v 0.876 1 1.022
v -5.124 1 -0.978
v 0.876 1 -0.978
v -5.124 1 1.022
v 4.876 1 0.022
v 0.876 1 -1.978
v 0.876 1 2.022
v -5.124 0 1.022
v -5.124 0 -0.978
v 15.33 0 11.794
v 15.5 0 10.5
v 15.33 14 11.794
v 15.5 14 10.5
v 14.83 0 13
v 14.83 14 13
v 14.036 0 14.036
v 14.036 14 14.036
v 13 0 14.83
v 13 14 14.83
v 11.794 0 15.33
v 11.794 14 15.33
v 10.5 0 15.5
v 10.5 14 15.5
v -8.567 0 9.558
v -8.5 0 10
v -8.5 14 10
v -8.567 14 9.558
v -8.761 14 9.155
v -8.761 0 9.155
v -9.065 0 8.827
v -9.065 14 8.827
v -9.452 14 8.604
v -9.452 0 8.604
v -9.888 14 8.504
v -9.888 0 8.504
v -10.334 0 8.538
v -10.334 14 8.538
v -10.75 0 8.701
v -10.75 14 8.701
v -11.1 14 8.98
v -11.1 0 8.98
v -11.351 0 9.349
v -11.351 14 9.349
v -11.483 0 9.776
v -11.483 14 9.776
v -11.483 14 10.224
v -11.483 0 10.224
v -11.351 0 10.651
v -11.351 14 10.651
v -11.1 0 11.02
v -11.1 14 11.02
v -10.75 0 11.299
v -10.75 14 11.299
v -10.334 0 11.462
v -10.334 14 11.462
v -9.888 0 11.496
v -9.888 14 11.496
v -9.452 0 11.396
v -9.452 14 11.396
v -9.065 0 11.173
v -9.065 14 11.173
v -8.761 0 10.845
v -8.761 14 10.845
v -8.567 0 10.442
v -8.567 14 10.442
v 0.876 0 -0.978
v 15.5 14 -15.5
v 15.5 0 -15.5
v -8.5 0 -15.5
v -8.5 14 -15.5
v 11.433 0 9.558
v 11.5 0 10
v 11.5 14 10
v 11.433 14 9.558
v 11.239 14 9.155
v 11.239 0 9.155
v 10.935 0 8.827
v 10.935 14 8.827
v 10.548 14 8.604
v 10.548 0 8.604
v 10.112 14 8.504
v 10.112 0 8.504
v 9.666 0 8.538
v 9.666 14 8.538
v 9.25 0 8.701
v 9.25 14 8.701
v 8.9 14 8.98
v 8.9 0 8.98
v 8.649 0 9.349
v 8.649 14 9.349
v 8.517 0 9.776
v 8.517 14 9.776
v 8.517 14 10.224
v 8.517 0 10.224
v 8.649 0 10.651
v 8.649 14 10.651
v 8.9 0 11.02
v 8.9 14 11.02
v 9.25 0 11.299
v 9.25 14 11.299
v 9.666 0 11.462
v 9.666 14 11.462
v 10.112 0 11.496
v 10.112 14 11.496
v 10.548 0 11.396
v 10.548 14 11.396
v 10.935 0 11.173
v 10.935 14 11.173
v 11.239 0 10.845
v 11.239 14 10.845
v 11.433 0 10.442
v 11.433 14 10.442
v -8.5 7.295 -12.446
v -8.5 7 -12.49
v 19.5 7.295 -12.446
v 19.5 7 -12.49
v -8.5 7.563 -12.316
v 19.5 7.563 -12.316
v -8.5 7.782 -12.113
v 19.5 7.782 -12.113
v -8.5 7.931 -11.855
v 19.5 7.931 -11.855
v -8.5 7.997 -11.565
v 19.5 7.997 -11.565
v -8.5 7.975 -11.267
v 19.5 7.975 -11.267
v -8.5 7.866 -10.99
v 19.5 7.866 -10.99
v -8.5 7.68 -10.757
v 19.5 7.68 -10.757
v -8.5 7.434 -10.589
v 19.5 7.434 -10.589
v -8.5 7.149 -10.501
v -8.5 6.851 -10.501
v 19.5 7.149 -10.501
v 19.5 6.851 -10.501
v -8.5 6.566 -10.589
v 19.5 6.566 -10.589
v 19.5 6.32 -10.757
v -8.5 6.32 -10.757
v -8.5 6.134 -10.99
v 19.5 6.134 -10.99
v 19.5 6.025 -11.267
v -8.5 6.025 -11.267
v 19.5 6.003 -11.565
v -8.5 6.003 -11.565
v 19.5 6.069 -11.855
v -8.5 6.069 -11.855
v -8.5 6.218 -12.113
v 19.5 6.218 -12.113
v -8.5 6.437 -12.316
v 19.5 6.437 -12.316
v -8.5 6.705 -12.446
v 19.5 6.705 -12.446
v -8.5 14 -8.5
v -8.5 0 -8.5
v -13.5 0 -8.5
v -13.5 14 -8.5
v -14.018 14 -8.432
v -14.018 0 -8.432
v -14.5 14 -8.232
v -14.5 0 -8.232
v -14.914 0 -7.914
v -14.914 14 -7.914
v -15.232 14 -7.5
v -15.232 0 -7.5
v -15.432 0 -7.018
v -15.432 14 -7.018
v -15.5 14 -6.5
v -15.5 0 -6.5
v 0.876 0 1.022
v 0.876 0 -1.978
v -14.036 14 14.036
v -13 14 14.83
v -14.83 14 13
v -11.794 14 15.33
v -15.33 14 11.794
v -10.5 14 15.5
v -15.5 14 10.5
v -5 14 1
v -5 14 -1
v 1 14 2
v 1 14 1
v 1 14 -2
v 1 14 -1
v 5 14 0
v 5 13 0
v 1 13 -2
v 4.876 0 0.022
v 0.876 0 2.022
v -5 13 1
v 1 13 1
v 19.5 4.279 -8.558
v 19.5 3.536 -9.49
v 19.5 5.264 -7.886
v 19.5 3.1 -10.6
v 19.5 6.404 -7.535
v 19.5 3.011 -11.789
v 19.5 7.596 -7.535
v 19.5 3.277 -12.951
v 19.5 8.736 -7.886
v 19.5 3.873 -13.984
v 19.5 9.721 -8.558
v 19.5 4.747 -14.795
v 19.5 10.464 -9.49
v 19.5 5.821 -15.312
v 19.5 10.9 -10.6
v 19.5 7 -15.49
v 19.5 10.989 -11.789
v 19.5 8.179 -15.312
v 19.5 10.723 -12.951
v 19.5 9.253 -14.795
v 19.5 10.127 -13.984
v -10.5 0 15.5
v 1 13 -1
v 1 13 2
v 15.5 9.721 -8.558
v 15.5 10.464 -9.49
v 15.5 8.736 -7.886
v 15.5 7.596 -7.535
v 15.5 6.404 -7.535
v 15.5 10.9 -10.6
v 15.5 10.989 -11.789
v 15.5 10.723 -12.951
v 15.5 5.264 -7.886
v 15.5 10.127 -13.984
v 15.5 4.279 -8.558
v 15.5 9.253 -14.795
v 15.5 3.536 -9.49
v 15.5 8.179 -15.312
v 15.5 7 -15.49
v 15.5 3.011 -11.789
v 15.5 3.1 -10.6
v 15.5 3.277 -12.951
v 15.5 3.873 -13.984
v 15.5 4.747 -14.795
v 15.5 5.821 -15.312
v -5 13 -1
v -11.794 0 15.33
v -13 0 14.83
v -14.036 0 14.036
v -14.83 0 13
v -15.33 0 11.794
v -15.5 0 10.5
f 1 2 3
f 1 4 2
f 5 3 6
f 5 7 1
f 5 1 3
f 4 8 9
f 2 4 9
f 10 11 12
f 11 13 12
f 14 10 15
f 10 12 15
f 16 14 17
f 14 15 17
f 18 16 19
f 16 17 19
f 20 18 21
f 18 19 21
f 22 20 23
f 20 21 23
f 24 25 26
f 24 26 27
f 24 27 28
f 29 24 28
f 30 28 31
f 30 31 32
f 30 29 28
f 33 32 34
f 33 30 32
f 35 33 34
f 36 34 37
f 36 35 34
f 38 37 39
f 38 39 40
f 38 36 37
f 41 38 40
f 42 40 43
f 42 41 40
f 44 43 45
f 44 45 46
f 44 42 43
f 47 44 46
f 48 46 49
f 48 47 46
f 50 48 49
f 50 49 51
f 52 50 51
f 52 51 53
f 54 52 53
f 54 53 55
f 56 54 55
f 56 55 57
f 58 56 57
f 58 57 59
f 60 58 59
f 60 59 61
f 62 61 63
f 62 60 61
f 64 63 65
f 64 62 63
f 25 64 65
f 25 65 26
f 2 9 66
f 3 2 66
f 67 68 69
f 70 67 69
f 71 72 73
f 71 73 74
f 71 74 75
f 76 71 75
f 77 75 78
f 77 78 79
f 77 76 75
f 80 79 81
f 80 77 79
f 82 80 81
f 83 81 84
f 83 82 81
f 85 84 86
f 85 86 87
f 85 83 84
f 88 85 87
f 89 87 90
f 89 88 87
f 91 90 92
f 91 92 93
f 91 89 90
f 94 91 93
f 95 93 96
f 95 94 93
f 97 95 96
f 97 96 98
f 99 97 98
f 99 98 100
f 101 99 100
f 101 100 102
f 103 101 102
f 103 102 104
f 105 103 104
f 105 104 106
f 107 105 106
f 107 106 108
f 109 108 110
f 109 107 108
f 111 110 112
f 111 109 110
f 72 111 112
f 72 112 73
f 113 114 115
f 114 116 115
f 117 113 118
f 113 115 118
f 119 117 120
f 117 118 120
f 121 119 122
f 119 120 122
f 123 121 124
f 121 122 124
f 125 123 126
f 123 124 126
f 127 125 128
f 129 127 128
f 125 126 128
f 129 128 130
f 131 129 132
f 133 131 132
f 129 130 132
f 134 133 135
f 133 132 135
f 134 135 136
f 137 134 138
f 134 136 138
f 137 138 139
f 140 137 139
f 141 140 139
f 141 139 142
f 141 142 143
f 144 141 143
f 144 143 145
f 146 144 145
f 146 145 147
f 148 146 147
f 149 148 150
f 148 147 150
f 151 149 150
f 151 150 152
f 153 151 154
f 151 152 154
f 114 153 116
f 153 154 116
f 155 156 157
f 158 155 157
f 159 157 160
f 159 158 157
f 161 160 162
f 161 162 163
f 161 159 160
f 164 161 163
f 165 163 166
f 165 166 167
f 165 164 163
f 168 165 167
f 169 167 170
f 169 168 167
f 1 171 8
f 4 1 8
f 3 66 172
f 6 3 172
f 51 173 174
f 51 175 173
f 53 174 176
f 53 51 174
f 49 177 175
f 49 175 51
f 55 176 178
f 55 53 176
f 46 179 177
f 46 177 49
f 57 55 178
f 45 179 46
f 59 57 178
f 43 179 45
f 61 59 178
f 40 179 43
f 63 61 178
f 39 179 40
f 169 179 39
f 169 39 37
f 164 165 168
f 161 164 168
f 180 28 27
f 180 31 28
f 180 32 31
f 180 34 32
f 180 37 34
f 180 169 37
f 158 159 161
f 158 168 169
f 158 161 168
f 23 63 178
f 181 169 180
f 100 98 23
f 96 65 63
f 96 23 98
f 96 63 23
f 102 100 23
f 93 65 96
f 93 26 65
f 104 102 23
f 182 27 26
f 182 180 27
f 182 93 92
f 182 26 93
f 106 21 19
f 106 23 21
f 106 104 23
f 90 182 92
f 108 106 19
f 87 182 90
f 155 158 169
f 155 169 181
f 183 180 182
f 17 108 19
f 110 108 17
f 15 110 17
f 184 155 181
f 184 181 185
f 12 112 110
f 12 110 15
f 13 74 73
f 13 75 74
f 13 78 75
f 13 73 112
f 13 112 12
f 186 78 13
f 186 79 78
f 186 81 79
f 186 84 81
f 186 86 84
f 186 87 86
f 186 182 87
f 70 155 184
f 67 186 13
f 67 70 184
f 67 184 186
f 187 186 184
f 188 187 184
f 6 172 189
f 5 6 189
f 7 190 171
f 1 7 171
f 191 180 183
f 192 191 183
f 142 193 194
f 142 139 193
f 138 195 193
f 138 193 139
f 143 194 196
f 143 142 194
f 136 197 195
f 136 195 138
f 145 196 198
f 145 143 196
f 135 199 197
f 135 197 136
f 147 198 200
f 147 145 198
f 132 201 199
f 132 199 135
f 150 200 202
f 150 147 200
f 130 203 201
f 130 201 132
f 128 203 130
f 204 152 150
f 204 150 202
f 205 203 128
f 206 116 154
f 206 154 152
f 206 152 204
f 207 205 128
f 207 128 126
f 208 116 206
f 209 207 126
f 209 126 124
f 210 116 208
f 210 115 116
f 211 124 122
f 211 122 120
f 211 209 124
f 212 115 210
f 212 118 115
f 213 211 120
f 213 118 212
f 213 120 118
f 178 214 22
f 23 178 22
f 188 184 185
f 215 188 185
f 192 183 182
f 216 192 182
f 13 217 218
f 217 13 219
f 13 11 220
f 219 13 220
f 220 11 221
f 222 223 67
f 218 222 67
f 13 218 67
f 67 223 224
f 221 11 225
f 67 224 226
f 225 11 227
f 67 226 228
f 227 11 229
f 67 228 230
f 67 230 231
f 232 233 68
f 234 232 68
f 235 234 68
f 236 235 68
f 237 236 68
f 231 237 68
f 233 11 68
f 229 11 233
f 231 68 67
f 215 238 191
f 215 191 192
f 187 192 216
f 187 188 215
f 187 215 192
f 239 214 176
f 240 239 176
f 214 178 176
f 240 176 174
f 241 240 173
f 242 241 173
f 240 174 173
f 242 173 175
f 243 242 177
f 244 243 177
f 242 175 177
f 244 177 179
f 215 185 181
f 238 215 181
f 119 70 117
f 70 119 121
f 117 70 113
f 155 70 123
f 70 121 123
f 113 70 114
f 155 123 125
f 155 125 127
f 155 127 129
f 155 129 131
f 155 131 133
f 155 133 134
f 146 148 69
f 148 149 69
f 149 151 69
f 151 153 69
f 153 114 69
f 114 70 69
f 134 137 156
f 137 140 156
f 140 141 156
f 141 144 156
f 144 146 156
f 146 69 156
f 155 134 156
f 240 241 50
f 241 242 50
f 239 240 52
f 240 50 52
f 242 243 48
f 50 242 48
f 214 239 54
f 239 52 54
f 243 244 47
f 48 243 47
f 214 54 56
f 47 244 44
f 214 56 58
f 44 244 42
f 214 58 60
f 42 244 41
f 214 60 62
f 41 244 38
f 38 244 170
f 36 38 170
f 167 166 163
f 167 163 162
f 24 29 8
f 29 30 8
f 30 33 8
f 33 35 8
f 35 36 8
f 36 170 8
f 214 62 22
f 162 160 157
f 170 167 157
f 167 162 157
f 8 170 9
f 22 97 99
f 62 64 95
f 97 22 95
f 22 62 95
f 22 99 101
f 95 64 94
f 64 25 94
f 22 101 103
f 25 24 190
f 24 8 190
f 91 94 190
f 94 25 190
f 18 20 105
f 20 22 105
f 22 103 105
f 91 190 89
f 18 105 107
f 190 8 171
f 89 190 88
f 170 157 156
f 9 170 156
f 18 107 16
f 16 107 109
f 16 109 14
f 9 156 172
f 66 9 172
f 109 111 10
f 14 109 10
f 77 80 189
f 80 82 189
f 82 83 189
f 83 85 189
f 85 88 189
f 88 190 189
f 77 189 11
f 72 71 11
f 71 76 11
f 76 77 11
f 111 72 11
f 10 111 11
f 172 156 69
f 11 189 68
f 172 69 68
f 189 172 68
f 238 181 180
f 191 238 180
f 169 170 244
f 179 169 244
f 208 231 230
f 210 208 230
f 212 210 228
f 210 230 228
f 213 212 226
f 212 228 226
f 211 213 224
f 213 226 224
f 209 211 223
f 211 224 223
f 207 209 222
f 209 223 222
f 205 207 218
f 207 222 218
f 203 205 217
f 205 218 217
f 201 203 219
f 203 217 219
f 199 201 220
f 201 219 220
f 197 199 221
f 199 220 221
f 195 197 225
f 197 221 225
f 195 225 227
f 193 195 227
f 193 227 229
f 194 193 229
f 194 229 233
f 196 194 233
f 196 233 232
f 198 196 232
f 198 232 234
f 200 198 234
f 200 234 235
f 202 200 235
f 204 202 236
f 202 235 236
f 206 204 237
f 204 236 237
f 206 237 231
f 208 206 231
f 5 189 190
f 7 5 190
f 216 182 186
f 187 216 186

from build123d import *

# Parameters (mm, degrees)
ESBO_O1_R                  = 1.5
RESSALTO_EXTRUS_O1_DEPTH   = 14
FILETE4_R                  = 5
FILETE5_R                  = 2
ESBO_O5_R                  = 4
RESSALTO_EXTRUS_O4_DEPTH   = 4
ESBO_O6_R                  = 1
CORTE_EXTRUS_O3_DEPTH      = 5
CORTE_EXTRUS_O3_DEPTH_BACK = 32
CORTE_EXTRUS_O4_DEPTH      = 1
CORTE_EXTRUS_O5_DEPTH      = 1


with BuildPart() as part:
    # Esboço1 → Ressalto-extrusão1 (new body)
    with BuildSketch(Plane(origin=(0, 0, 0), x_dir=(1, 0, 0), z_dir=(0, 1, 0))):
        Polygon((15.5, 15.5), (-8.5, 15.5), (-8.5, 8.5), (-15.5, 8.5), (-15.5, -15.5), (15.5, -15.5), align=None)
        with Locations((-10, -10)):
            Circle(ESBO_O1_R, mode=Mode.SUBTRACT)
        with Locations((10, -10)):
            Circle(ESBO_O1_R, mode=Mode.SUBTRACT)
    extrude(amount=RESSALTO_EXTRUS_O1_DEPTH)

    # Filete4
    filete4_edges = [part.edges().sort_by_distance(p)[0] for p in [
        (15.5, 7, 15.5),
        (-15.5, 7, 15.5),
    ]]
    fillet(filete4_edges, radius=FILETE4_R)

    # Filete5
    filete5_edges = [part.edges().sort_by_distance(p)[0] for p in [
        (-15.5, 7, -8.5),
    ]]
    fillet(filete5_edges, radius=FILETE5_R)

    # Esboço5 → Ressalto-extrusão4 (add)
    with BuildSketch(Plane(origin=(15.5, 0, 0), x_dir=(0, 0, -1), z_dir=(1, 0, 0))):
        with Locations((11.49, 7)):
            Circle(ESBO_O5_R)
    extrude(amount=RESSALTO_EXTRUS_O4_DEPTH)

    # Esboço6 → Corte-extrusão3 (cut, two sides)
    with BuildSketch(Plane(origin=(15.5, 0, 0), x_dir=(0, 0, -1), z_dir=(1, 0, 0))) as corte_extrus_o3_sk:
        with Locations((11.49, 7)):
            Circle(ESBO_O6_R)
    extrude(amount=CORTE_EXTRUS_O3_DEPTH, mode=Mode.SUBTRACT)
    extrude(corte_extrus_o3_sk.sketch, amount=-CORTE_EXTRUS_O3_DEPTH_BACK, mode=Mode.SUBTRACT)

    # Esboço7 → Corte-extrusão4 (cut)
    with BuildSketch(Plane(origin=(0, 14, 0), x_dir=(1, 0, 0), z_dir=(0, 1, 0))):
        Polygon((-5, 1), (-5, -1), (1, -1), (1, -2), (5, 0), (1, 2), (1, 1), align=None)
    extrude(amount=-CORTE_EXTRUS_O4_DEPTH, mode=Mode.SUBTRACT)

    # Esboço9 → Corte-extrusão5 (cut)
    with BuildSketch(Plane.XZ):
        Polygon((-5.123658733, -0.978330013), (0.876341267, -0.978330013), (0.876341267, -1.978330013), (4.876341267, 0.021669987), (0.876341267, 2.021669987), (0.876341267, 1.021669987), (-5.123658733, 1.021669987), align=None)
    extrude(amount=-CORTE_EXTRUS_O5_DEPTH, mode=Mode.SUBTRACT)


solid = part.part
